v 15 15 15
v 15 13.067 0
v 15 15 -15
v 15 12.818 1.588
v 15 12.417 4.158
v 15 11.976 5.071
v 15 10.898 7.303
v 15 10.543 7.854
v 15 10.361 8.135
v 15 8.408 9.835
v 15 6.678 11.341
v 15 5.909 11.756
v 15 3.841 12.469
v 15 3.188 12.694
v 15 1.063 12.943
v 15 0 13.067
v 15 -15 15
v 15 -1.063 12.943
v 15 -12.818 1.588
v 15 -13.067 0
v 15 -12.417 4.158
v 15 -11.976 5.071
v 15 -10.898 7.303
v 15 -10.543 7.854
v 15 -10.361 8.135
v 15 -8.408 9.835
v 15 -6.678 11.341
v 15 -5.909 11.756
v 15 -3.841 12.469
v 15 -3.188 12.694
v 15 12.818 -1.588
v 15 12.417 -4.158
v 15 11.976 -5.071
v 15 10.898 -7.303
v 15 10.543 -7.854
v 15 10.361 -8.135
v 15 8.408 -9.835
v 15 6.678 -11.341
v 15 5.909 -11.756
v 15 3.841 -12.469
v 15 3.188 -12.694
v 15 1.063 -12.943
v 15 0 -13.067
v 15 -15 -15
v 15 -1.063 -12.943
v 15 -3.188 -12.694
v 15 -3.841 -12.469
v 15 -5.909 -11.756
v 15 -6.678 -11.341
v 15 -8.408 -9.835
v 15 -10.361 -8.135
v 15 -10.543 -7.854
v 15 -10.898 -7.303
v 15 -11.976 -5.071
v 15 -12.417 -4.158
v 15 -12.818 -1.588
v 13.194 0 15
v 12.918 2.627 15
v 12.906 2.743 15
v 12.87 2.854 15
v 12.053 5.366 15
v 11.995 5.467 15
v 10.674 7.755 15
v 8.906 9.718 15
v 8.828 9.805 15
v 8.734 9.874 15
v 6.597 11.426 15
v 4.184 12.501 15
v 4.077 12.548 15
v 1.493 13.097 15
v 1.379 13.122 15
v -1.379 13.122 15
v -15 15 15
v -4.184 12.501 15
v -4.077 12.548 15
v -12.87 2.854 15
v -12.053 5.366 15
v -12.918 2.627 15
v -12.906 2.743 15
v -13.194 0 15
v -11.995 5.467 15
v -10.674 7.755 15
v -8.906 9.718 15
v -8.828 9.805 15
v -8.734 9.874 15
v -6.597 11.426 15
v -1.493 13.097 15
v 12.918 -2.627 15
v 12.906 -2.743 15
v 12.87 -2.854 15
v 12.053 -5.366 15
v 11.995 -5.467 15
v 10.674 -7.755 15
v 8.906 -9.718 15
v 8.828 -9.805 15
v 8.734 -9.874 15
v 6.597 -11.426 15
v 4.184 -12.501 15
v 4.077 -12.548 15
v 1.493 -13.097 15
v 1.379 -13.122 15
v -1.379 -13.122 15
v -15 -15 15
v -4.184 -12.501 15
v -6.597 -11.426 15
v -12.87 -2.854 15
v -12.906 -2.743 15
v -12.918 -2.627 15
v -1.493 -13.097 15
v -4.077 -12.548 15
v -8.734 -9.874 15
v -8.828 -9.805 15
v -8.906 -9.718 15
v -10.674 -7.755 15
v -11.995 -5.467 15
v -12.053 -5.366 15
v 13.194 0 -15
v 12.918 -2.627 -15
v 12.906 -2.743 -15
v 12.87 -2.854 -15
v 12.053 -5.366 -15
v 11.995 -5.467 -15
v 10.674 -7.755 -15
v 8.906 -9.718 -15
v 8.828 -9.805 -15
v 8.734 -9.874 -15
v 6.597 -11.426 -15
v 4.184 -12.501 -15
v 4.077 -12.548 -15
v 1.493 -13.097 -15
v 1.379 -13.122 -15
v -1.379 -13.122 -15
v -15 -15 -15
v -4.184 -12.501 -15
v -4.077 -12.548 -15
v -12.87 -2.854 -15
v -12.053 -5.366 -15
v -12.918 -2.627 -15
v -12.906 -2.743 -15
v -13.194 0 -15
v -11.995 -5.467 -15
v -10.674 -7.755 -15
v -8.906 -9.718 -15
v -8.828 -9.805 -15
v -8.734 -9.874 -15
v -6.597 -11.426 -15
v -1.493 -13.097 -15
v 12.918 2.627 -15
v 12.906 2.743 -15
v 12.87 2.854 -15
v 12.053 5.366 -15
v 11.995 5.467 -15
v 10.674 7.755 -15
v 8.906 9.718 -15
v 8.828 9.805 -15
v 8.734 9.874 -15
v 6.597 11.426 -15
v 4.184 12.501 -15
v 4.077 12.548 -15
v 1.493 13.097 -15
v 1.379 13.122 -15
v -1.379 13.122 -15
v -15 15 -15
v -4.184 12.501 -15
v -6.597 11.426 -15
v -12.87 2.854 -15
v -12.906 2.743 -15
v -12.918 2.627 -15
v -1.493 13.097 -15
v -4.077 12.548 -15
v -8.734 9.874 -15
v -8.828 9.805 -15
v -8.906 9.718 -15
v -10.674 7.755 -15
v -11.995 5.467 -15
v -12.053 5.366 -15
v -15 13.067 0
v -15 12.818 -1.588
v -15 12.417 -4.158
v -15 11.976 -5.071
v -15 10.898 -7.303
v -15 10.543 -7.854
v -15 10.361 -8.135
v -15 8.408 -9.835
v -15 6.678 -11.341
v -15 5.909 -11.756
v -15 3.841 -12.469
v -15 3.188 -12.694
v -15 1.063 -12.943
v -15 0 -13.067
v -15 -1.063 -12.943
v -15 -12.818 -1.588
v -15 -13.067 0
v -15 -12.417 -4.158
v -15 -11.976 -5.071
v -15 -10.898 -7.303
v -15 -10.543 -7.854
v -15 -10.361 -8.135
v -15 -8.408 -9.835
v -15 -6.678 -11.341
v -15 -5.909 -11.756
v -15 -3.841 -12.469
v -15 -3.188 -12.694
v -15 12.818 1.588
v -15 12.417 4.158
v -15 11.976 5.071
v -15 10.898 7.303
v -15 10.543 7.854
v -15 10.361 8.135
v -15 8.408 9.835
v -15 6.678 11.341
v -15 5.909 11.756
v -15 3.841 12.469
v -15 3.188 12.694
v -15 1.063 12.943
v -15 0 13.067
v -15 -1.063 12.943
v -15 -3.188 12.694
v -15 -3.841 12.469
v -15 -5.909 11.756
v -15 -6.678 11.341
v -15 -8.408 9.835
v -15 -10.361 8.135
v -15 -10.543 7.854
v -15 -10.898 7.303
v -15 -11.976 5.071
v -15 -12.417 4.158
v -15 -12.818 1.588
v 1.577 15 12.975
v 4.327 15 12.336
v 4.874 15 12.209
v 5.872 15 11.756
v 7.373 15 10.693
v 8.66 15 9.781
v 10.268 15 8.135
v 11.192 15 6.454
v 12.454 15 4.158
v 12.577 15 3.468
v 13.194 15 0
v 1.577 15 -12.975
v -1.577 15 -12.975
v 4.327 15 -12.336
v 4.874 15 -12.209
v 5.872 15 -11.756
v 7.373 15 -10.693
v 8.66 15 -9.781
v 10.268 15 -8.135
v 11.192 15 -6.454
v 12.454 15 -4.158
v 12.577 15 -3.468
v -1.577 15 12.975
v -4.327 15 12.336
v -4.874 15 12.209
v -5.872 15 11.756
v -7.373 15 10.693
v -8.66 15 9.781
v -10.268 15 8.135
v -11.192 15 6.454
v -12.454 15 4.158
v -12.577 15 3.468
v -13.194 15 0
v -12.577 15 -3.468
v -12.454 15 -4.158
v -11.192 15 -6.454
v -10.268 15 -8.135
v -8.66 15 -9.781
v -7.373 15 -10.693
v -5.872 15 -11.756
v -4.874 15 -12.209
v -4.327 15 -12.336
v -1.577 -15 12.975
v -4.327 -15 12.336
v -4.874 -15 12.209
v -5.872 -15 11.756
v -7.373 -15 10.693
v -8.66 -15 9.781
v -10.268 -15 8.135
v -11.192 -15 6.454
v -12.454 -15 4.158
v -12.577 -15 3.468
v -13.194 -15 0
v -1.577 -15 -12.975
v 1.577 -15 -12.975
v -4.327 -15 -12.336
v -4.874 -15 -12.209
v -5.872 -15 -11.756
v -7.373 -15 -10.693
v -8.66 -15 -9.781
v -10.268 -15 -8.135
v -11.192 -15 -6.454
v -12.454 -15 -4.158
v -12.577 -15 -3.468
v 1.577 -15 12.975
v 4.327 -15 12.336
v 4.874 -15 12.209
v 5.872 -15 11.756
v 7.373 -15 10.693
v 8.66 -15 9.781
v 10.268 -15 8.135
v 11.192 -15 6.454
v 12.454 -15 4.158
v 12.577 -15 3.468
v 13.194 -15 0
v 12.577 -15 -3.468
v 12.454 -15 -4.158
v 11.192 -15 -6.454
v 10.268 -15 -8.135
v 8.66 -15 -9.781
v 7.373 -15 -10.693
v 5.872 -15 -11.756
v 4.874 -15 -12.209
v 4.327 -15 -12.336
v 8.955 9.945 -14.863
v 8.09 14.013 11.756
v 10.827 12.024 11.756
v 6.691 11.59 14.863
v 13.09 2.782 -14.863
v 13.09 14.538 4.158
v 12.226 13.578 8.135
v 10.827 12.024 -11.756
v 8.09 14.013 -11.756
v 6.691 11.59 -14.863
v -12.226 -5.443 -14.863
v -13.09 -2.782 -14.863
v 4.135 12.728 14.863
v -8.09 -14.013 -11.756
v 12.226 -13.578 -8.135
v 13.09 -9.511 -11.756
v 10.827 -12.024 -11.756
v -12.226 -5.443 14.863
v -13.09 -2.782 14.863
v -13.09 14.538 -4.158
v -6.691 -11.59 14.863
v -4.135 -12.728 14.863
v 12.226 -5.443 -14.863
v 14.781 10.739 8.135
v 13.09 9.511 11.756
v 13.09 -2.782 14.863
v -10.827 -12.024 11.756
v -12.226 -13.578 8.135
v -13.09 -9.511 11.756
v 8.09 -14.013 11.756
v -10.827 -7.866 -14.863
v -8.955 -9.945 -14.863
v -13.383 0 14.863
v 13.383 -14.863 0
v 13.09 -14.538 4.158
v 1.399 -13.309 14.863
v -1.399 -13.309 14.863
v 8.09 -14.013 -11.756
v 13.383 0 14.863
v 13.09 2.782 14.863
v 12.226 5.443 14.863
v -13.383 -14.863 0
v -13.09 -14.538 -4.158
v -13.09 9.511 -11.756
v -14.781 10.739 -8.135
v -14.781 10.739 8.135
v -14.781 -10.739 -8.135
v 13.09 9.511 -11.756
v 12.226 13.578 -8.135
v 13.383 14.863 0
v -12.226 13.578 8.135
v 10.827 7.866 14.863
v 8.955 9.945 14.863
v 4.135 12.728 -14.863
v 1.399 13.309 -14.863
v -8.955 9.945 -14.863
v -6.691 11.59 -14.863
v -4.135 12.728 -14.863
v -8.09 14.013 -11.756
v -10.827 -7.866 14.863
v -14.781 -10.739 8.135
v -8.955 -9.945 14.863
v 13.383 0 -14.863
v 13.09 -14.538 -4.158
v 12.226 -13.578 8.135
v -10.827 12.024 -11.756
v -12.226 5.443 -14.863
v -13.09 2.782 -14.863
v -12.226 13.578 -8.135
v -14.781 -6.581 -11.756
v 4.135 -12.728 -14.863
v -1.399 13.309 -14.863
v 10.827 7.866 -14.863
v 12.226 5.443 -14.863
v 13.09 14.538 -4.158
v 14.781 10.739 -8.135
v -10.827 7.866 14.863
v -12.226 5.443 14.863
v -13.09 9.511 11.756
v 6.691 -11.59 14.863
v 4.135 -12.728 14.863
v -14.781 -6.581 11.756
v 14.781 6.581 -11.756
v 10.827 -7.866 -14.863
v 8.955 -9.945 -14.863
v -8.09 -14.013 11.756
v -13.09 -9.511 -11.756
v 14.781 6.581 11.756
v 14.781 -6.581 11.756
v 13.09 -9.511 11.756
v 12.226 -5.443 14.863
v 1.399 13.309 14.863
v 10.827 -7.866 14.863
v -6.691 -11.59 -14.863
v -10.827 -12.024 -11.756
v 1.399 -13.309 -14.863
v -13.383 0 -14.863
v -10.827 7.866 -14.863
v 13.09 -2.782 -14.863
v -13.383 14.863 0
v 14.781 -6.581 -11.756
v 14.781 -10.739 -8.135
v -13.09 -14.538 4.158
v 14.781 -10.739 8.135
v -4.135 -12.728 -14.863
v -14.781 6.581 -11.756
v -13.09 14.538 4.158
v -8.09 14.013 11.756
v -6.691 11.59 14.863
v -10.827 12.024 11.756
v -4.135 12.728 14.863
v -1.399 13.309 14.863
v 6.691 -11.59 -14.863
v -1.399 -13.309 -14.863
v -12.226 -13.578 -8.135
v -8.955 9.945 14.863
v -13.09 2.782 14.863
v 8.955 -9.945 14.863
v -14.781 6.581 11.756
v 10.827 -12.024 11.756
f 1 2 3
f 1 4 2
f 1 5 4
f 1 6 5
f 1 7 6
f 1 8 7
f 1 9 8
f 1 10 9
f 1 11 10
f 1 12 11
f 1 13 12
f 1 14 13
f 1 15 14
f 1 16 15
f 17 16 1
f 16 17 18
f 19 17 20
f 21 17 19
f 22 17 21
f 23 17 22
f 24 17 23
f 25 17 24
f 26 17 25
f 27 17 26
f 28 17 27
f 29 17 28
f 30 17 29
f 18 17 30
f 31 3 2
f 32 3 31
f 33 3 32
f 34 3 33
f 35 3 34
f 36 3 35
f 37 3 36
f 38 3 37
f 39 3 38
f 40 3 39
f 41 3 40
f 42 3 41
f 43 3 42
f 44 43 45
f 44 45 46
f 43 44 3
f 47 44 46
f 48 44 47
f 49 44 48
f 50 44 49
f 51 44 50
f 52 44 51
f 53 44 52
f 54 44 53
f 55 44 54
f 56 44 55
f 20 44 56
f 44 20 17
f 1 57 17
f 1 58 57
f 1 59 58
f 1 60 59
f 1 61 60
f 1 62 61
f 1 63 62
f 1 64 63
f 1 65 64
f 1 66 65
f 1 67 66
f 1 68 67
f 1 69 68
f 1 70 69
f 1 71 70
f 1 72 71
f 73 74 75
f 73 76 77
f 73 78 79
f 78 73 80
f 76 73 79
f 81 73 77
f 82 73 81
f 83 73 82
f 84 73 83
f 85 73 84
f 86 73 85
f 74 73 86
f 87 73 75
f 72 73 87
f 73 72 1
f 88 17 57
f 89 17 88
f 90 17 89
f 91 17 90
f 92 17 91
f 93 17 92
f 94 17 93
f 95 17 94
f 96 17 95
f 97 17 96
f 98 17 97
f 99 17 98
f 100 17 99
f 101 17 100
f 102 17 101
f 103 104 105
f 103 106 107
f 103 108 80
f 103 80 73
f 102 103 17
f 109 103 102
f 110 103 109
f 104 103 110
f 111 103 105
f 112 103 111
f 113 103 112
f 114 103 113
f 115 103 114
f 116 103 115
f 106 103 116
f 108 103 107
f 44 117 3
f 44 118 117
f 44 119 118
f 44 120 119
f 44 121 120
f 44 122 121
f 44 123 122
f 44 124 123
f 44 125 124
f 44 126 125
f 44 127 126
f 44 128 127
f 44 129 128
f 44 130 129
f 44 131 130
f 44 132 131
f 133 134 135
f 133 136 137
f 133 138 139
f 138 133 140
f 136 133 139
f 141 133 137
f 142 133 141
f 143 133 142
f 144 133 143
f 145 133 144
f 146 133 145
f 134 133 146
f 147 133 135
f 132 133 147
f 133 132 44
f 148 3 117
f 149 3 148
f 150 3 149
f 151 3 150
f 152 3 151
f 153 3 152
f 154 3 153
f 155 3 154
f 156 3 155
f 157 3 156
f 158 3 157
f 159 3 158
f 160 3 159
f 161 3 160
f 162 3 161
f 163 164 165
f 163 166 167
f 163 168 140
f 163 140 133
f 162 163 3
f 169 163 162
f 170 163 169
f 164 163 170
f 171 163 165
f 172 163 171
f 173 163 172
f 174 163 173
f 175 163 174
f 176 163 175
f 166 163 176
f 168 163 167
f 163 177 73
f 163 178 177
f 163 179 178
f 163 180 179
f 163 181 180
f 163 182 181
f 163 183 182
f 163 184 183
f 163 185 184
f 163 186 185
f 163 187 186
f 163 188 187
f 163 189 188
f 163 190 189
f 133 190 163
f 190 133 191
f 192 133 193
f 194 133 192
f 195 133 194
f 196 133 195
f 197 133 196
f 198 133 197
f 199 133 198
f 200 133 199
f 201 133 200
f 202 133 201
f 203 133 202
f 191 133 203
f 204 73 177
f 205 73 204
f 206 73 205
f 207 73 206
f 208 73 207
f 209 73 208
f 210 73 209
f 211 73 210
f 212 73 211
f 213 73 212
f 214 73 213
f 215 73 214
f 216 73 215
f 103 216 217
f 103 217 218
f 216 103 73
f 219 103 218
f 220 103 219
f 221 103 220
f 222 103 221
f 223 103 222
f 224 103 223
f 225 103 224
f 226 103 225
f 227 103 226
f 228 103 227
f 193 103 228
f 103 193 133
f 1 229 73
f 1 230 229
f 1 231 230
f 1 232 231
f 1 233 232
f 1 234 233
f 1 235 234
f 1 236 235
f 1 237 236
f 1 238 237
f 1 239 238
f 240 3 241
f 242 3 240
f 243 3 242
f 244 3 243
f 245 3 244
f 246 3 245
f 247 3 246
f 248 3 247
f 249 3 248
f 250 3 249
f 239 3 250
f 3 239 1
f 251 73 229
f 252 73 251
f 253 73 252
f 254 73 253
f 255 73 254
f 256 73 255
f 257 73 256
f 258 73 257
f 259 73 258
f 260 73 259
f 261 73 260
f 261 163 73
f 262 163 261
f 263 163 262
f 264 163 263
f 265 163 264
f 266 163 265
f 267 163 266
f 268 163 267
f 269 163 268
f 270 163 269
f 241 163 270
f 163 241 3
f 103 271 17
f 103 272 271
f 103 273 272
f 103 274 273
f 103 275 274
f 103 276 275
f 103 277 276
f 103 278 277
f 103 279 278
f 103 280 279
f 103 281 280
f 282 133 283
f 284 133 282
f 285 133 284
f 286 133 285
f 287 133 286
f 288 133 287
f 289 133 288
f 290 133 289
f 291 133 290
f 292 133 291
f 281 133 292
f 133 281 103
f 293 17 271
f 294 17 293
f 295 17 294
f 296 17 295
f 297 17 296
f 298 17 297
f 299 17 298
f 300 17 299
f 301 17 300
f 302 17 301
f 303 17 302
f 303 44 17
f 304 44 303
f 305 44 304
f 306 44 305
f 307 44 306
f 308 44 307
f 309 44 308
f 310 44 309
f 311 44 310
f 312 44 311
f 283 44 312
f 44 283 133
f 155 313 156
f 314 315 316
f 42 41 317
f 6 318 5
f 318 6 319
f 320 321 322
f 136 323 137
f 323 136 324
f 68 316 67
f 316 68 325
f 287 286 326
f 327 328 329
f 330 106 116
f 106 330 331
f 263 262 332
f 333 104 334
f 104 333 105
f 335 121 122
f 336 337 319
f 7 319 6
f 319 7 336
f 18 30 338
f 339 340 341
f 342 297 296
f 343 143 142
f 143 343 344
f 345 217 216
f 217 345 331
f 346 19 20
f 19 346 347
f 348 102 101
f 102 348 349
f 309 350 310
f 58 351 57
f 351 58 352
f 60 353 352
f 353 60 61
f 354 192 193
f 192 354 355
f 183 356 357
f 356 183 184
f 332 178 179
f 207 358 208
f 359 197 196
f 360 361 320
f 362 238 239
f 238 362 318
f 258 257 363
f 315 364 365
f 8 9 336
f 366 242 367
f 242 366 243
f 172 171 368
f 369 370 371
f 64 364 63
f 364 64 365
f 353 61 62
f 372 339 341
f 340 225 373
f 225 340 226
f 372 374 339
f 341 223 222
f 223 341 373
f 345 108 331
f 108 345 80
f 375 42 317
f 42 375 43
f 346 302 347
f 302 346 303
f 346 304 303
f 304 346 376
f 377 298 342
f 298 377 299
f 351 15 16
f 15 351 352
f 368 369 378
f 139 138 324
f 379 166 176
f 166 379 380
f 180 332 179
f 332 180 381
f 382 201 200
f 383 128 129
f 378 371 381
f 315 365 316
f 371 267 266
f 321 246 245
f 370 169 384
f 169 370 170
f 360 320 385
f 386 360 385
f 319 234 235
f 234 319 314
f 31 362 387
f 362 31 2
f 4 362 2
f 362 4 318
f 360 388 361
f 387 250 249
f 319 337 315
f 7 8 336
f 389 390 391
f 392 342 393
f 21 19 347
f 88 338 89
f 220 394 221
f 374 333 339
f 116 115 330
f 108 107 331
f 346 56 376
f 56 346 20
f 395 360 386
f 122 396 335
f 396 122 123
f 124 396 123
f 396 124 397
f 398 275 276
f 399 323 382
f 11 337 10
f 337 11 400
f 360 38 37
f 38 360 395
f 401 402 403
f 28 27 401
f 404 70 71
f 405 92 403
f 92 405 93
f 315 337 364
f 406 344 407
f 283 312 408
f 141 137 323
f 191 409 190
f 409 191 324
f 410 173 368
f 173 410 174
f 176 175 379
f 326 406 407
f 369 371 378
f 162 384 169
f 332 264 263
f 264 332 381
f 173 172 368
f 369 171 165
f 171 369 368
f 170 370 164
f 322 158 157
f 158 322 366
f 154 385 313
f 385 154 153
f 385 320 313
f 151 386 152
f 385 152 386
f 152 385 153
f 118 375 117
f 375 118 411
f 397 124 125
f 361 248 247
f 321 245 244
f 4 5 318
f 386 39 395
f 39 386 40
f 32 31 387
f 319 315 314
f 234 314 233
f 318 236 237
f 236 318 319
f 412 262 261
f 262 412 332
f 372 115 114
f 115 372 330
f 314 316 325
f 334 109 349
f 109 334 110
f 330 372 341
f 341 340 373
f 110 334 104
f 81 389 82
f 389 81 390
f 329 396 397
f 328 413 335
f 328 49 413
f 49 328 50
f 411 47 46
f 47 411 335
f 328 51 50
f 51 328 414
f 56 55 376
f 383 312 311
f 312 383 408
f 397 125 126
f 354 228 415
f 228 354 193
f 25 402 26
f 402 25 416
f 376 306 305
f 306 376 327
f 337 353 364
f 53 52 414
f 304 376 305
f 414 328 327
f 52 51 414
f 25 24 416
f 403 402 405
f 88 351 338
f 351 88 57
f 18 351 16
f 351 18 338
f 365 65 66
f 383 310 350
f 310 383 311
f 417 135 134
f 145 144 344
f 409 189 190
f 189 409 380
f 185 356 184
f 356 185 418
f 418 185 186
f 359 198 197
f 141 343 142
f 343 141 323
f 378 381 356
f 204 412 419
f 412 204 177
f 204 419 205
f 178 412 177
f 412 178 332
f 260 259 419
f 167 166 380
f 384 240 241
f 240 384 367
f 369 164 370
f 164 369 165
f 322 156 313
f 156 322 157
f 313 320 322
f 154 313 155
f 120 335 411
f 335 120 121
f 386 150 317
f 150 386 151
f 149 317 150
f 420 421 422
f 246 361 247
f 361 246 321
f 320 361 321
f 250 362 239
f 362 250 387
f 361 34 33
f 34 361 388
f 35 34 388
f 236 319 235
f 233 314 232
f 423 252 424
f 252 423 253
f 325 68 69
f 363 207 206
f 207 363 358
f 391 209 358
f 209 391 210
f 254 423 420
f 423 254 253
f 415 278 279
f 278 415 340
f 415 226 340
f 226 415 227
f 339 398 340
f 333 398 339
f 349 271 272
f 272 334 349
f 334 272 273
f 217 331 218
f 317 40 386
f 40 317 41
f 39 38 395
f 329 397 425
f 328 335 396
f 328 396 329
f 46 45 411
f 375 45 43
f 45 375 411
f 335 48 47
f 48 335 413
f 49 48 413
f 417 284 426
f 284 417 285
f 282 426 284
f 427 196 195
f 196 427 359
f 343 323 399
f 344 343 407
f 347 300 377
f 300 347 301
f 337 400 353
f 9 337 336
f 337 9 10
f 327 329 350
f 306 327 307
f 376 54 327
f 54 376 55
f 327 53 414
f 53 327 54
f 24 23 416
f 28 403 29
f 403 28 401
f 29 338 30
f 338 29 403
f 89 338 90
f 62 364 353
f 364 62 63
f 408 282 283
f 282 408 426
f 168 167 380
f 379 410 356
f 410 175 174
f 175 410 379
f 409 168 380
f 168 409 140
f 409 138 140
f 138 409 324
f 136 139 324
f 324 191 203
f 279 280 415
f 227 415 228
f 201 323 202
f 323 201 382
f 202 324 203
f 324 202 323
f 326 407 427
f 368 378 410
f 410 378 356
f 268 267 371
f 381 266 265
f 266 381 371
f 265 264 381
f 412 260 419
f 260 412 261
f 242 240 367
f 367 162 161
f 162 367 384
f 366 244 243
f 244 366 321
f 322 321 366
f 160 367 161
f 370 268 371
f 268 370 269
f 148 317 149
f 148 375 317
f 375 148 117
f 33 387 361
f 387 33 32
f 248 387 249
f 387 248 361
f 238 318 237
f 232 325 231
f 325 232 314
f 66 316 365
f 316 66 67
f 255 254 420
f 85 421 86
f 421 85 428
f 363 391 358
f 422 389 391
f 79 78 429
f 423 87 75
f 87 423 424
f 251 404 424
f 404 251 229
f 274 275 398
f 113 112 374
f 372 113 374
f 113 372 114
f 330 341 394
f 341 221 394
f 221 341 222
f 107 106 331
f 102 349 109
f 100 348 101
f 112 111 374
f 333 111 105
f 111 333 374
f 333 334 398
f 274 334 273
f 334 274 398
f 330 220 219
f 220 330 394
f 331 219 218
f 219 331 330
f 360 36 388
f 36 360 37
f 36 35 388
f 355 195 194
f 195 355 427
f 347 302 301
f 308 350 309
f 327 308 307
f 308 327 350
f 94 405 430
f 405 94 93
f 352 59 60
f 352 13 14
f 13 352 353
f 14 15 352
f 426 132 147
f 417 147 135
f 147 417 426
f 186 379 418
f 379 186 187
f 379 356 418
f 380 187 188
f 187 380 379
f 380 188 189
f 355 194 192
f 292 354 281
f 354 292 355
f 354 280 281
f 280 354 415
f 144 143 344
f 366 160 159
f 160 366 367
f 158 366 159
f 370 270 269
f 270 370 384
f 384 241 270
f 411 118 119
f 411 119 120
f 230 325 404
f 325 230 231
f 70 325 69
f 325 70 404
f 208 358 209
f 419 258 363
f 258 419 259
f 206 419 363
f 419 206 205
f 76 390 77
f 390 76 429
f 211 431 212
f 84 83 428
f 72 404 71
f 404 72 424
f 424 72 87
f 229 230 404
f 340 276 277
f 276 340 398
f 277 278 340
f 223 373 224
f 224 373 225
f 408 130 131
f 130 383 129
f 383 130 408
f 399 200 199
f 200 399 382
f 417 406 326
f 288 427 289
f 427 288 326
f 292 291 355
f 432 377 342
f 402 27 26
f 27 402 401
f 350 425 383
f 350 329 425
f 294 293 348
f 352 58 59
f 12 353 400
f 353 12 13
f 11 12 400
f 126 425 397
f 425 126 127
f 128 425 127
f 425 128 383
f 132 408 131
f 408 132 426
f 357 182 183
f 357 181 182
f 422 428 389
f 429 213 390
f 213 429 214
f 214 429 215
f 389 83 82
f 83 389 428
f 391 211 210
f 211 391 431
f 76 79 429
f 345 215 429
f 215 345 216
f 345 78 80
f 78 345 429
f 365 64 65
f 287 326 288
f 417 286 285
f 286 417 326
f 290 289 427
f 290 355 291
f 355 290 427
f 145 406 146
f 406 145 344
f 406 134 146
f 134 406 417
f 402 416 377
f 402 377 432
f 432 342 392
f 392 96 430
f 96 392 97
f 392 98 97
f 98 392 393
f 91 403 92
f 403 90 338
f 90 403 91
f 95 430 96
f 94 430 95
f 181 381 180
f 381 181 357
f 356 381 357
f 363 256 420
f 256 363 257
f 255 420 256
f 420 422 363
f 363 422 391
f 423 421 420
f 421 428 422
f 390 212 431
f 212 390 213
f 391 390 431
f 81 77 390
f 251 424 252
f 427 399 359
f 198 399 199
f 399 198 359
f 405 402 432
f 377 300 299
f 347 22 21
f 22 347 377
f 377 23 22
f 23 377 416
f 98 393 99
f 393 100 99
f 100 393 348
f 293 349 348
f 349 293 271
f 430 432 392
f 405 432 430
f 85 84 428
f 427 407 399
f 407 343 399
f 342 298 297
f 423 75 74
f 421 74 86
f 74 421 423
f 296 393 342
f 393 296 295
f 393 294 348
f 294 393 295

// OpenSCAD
module example004()
{
  difference() {
    cube(30, center = true);
    sphere(20);
  }
}

echo(version=version());

example004();

// Written by Clifford Wolf <clifford@clifford.at> and Marius
// Kintel <marius@kintel.net>
//
// To the extent possible under law, the author(s) have dedicated all
// copyright and related and neighboring rights to this software to the
// public domain worldwide. This software is distributed without any
// warranty.
//
// You should have received a copy of the CC0 Public Domain
// Dedication along with this software.
// If not, see <http://creativecommons.org/publicdomain/zero/1.0/>.
